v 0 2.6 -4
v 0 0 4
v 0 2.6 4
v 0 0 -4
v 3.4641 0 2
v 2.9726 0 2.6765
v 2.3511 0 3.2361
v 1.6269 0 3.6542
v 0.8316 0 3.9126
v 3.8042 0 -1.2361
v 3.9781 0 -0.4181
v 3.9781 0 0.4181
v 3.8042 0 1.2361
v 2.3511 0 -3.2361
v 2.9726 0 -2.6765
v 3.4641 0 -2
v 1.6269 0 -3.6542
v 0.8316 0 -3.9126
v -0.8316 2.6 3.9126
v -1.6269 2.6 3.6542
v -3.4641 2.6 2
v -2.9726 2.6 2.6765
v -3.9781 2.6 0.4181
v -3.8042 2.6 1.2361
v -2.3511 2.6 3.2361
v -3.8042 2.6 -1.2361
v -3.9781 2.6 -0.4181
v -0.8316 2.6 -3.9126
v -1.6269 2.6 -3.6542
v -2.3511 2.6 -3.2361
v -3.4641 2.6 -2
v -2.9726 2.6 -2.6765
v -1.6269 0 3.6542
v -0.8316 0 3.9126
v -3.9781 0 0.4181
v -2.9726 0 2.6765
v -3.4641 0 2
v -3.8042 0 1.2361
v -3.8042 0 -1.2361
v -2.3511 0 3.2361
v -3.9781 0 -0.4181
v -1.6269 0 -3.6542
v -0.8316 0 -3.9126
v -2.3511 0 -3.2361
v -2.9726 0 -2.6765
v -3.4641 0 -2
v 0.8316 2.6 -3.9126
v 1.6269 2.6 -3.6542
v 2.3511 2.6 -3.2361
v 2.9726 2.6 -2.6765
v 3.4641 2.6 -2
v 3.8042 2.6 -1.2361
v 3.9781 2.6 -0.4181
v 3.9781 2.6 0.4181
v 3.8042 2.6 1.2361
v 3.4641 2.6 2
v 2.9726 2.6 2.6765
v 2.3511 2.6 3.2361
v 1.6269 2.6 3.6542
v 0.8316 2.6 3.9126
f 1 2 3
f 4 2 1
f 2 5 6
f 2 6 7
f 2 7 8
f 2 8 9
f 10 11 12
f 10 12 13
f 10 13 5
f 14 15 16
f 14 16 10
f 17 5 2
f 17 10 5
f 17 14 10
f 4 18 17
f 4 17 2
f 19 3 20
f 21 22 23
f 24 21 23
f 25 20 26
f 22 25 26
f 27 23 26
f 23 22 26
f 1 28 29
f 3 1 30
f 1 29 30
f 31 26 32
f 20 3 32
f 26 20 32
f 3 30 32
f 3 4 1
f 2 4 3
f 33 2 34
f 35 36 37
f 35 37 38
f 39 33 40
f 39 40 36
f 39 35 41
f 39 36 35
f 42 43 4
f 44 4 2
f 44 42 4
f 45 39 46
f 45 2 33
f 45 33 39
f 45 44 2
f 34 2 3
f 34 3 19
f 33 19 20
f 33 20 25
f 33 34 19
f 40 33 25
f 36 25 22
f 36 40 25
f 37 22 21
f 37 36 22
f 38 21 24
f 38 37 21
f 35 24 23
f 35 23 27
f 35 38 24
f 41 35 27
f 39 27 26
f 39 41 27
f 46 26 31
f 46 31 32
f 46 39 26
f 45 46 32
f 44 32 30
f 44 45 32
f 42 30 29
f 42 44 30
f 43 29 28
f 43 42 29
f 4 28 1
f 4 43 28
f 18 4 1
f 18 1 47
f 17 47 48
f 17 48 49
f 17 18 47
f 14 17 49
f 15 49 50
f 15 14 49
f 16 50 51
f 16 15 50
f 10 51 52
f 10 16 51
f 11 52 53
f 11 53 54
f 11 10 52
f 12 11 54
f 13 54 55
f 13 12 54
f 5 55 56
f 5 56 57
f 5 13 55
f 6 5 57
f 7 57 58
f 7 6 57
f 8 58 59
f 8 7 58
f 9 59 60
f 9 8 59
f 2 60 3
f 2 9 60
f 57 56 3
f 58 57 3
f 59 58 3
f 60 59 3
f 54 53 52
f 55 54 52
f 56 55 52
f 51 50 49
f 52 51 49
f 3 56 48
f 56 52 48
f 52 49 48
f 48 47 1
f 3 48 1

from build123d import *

# Parameters (mm, degrees)
BOSS_EXTRU_1_DEPTH = 2.6
BOSS_EXTRU_2_DEPTH = 2.6


with BuildPart() as part:
    # Esquisse1 → Boss.-Extru.1 (new body)
    with BuildSketch(Plane(origin=(0, 0, 0), x_dir=(1, 0, 0), z_dir=(0, 1, 0))):
        with BuildLine():
            Line((0, 4), (0, -4))
            ThreePointArc((0, -4), (-4, 0), (0, 4))
        make_face()
    extrude(amount=BOSS_EXTRU_1_DEPTH)


with BuildPart() as body_2:
    # Esquisse2 → Boss.-Extru.2 (new body)
    with BuildSketch(Plane(origin=(0, 0, 0), x_dir=(1, 0, 0), z_dir=(0, 1, 0))):
        with BuildLine():
            Line((0, -4), (0, 4))
            ThreePointArc((0, 4), (4, 0), (0, -4))
        make_face()
    extrude(amount=BOSS_EXTRU_2_DEPTH)


solid = Compound([part.part, body_2.part])
